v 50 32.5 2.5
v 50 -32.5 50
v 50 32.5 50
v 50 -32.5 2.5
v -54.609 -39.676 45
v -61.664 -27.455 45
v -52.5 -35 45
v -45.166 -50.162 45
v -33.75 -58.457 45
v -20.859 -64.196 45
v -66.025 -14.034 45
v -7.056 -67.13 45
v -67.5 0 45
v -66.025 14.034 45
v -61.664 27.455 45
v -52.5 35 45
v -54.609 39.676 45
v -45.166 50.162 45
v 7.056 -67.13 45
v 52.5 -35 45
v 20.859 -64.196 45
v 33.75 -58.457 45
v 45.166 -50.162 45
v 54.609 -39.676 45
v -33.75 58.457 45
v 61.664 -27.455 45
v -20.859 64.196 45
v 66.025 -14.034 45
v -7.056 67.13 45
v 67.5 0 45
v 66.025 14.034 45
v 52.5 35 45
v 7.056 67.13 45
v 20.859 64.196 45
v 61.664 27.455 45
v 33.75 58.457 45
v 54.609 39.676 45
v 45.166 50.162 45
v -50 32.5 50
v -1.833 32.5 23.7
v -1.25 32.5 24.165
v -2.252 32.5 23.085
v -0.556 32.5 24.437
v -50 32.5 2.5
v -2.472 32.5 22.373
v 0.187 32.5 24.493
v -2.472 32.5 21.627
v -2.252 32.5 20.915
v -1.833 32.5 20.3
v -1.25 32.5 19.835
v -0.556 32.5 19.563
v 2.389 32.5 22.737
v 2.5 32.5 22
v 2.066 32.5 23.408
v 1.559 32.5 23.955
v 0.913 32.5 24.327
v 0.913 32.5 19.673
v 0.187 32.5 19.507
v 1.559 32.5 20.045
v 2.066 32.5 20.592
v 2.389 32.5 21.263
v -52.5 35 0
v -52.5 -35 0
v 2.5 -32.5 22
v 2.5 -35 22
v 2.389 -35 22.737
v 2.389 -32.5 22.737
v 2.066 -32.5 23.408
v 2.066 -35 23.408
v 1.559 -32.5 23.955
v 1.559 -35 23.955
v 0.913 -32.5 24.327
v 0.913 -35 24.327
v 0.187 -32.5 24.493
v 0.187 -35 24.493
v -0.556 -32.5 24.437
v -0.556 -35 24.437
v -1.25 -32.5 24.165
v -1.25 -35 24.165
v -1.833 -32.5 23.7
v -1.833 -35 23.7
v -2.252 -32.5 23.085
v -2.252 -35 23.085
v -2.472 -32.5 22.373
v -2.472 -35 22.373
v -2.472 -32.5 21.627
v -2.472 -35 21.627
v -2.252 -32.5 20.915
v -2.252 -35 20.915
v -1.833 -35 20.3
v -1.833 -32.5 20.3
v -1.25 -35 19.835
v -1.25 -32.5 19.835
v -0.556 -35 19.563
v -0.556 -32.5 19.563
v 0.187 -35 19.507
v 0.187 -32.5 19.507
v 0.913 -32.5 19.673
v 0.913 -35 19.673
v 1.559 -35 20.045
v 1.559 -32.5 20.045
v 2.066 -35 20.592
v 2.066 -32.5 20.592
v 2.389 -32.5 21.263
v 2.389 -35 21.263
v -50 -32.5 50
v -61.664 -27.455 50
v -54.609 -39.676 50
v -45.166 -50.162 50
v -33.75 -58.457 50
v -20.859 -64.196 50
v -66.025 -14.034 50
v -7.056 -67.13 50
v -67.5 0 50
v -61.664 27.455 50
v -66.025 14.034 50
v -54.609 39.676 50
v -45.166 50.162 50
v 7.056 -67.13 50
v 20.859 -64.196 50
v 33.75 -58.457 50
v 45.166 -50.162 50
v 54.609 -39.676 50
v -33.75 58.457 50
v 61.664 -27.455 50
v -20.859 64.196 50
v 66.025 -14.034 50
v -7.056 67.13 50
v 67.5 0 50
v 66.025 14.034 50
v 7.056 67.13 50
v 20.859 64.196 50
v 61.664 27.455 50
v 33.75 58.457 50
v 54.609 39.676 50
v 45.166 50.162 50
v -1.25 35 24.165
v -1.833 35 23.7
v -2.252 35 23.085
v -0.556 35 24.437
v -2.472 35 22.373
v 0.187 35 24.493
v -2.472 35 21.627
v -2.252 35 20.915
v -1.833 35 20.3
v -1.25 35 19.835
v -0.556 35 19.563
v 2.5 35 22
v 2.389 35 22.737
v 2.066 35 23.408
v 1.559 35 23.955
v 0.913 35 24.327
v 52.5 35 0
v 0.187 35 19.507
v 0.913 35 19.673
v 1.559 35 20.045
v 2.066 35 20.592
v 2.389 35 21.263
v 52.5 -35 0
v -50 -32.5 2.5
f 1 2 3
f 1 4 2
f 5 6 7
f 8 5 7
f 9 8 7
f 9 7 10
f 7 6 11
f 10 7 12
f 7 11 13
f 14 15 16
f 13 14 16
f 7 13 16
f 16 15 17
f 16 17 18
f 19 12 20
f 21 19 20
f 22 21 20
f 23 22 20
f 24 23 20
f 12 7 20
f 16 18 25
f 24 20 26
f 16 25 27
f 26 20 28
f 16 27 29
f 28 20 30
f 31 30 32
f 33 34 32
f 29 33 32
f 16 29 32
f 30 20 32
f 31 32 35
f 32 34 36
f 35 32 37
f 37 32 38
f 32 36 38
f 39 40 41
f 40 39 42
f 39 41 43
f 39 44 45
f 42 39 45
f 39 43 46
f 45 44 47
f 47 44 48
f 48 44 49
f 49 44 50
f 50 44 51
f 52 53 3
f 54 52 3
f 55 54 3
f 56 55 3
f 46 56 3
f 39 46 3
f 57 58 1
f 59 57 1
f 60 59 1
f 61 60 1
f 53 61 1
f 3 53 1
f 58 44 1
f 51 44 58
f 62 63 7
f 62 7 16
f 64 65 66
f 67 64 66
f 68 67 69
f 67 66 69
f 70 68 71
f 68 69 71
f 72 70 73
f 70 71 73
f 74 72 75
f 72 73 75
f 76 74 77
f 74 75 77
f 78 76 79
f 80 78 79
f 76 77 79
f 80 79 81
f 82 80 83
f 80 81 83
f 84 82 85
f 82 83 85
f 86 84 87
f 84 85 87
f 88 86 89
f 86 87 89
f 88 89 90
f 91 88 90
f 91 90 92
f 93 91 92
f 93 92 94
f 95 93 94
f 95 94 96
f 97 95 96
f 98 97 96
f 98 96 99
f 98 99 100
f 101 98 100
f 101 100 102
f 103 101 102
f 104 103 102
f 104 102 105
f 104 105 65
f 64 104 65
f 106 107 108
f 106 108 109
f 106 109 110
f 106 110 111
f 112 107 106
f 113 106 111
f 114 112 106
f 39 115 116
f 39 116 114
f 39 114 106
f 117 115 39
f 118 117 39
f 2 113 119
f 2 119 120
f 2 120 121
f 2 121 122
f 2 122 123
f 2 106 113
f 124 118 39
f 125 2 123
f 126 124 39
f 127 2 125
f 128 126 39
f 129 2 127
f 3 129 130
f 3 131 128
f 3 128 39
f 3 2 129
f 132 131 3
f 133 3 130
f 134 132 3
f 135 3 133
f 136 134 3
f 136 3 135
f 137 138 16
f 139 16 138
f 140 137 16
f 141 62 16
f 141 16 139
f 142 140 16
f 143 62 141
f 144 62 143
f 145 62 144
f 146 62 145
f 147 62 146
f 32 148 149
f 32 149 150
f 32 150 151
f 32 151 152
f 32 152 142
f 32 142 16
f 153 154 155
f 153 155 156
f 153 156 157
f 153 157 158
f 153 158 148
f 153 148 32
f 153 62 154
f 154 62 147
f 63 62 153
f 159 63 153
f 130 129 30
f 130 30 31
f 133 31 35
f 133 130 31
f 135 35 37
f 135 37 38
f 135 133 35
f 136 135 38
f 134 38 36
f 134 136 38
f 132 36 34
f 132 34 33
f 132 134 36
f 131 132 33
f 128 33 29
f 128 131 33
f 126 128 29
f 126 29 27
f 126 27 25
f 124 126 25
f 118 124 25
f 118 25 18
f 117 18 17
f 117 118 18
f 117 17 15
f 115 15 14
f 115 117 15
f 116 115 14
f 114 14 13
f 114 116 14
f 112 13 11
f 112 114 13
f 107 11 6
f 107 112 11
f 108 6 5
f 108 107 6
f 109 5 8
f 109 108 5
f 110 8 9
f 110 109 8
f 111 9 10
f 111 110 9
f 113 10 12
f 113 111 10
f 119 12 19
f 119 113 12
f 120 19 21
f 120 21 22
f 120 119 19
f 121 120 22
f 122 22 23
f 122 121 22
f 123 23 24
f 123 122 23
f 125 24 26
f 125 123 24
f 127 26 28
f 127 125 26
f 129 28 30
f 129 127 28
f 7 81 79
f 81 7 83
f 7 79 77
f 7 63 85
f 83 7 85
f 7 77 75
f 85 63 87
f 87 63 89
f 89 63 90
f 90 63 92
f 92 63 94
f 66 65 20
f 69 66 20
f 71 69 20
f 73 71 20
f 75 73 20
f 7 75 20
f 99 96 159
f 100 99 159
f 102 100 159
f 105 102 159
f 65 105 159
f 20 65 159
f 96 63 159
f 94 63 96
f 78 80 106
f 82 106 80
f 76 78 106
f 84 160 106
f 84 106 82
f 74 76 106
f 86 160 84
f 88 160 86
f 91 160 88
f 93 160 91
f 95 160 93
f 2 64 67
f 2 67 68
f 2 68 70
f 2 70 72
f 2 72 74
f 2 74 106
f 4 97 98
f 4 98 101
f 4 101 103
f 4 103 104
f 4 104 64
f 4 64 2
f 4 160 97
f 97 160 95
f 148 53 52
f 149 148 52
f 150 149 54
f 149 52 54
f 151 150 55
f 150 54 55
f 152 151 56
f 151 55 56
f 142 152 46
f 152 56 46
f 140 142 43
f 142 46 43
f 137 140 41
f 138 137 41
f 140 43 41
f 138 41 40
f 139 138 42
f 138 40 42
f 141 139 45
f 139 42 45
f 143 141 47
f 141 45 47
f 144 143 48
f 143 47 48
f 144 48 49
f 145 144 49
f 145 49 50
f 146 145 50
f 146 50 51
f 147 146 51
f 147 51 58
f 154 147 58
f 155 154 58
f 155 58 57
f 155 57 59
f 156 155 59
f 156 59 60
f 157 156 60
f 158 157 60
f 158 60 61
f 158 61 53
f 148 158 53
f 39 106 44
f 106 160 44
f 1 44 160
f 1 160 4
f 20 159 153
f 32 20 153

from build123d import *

# Parameters (mm, degrees)
F0_W     = 105
F0_H     = 70
F1_DEPTH = 50
F2_T     = -2.5
F3_R     = 67.5
F3_W     = 105
F3_H     = 70
F4_DEPTH = 5
F5_R     = 2.5
F6_DEPTH = 102.501


with BuildPart() as f1:
    # F0 (on Top) → F1 (new body)
    with BuildSketch(Plane.XY):
        Rectangle(F0_W, F0_H)
    extrude(amount=F1_DEPTH)

    # F2
    f2_openings = [f1.faces().sort_by_distance(p)[0] for p in [
        (0, 0, 50),
    ]]
    offset(amount=F2_T, openings=f2_openings)

    # F3 (on face) → F4 (join)
    with BuildSketch(Plane.XY.offset(50)):
        Circle(F3_R)
        Rectangle(F3_W, F3_H, mode=Mode.SUBTRACT)
    extrude(amount=-F4_DEPTH)

    # F5 (on face) → F6 (cut, through all)
    with BuildSketch(Plane.XZ.offset(35)):
        with Locations((0, 22)):
            Circle(F5_R)
    extrude(amount=-F6_DEPTH, mode=Mode.SUBTRACT)


solid = f1.part
